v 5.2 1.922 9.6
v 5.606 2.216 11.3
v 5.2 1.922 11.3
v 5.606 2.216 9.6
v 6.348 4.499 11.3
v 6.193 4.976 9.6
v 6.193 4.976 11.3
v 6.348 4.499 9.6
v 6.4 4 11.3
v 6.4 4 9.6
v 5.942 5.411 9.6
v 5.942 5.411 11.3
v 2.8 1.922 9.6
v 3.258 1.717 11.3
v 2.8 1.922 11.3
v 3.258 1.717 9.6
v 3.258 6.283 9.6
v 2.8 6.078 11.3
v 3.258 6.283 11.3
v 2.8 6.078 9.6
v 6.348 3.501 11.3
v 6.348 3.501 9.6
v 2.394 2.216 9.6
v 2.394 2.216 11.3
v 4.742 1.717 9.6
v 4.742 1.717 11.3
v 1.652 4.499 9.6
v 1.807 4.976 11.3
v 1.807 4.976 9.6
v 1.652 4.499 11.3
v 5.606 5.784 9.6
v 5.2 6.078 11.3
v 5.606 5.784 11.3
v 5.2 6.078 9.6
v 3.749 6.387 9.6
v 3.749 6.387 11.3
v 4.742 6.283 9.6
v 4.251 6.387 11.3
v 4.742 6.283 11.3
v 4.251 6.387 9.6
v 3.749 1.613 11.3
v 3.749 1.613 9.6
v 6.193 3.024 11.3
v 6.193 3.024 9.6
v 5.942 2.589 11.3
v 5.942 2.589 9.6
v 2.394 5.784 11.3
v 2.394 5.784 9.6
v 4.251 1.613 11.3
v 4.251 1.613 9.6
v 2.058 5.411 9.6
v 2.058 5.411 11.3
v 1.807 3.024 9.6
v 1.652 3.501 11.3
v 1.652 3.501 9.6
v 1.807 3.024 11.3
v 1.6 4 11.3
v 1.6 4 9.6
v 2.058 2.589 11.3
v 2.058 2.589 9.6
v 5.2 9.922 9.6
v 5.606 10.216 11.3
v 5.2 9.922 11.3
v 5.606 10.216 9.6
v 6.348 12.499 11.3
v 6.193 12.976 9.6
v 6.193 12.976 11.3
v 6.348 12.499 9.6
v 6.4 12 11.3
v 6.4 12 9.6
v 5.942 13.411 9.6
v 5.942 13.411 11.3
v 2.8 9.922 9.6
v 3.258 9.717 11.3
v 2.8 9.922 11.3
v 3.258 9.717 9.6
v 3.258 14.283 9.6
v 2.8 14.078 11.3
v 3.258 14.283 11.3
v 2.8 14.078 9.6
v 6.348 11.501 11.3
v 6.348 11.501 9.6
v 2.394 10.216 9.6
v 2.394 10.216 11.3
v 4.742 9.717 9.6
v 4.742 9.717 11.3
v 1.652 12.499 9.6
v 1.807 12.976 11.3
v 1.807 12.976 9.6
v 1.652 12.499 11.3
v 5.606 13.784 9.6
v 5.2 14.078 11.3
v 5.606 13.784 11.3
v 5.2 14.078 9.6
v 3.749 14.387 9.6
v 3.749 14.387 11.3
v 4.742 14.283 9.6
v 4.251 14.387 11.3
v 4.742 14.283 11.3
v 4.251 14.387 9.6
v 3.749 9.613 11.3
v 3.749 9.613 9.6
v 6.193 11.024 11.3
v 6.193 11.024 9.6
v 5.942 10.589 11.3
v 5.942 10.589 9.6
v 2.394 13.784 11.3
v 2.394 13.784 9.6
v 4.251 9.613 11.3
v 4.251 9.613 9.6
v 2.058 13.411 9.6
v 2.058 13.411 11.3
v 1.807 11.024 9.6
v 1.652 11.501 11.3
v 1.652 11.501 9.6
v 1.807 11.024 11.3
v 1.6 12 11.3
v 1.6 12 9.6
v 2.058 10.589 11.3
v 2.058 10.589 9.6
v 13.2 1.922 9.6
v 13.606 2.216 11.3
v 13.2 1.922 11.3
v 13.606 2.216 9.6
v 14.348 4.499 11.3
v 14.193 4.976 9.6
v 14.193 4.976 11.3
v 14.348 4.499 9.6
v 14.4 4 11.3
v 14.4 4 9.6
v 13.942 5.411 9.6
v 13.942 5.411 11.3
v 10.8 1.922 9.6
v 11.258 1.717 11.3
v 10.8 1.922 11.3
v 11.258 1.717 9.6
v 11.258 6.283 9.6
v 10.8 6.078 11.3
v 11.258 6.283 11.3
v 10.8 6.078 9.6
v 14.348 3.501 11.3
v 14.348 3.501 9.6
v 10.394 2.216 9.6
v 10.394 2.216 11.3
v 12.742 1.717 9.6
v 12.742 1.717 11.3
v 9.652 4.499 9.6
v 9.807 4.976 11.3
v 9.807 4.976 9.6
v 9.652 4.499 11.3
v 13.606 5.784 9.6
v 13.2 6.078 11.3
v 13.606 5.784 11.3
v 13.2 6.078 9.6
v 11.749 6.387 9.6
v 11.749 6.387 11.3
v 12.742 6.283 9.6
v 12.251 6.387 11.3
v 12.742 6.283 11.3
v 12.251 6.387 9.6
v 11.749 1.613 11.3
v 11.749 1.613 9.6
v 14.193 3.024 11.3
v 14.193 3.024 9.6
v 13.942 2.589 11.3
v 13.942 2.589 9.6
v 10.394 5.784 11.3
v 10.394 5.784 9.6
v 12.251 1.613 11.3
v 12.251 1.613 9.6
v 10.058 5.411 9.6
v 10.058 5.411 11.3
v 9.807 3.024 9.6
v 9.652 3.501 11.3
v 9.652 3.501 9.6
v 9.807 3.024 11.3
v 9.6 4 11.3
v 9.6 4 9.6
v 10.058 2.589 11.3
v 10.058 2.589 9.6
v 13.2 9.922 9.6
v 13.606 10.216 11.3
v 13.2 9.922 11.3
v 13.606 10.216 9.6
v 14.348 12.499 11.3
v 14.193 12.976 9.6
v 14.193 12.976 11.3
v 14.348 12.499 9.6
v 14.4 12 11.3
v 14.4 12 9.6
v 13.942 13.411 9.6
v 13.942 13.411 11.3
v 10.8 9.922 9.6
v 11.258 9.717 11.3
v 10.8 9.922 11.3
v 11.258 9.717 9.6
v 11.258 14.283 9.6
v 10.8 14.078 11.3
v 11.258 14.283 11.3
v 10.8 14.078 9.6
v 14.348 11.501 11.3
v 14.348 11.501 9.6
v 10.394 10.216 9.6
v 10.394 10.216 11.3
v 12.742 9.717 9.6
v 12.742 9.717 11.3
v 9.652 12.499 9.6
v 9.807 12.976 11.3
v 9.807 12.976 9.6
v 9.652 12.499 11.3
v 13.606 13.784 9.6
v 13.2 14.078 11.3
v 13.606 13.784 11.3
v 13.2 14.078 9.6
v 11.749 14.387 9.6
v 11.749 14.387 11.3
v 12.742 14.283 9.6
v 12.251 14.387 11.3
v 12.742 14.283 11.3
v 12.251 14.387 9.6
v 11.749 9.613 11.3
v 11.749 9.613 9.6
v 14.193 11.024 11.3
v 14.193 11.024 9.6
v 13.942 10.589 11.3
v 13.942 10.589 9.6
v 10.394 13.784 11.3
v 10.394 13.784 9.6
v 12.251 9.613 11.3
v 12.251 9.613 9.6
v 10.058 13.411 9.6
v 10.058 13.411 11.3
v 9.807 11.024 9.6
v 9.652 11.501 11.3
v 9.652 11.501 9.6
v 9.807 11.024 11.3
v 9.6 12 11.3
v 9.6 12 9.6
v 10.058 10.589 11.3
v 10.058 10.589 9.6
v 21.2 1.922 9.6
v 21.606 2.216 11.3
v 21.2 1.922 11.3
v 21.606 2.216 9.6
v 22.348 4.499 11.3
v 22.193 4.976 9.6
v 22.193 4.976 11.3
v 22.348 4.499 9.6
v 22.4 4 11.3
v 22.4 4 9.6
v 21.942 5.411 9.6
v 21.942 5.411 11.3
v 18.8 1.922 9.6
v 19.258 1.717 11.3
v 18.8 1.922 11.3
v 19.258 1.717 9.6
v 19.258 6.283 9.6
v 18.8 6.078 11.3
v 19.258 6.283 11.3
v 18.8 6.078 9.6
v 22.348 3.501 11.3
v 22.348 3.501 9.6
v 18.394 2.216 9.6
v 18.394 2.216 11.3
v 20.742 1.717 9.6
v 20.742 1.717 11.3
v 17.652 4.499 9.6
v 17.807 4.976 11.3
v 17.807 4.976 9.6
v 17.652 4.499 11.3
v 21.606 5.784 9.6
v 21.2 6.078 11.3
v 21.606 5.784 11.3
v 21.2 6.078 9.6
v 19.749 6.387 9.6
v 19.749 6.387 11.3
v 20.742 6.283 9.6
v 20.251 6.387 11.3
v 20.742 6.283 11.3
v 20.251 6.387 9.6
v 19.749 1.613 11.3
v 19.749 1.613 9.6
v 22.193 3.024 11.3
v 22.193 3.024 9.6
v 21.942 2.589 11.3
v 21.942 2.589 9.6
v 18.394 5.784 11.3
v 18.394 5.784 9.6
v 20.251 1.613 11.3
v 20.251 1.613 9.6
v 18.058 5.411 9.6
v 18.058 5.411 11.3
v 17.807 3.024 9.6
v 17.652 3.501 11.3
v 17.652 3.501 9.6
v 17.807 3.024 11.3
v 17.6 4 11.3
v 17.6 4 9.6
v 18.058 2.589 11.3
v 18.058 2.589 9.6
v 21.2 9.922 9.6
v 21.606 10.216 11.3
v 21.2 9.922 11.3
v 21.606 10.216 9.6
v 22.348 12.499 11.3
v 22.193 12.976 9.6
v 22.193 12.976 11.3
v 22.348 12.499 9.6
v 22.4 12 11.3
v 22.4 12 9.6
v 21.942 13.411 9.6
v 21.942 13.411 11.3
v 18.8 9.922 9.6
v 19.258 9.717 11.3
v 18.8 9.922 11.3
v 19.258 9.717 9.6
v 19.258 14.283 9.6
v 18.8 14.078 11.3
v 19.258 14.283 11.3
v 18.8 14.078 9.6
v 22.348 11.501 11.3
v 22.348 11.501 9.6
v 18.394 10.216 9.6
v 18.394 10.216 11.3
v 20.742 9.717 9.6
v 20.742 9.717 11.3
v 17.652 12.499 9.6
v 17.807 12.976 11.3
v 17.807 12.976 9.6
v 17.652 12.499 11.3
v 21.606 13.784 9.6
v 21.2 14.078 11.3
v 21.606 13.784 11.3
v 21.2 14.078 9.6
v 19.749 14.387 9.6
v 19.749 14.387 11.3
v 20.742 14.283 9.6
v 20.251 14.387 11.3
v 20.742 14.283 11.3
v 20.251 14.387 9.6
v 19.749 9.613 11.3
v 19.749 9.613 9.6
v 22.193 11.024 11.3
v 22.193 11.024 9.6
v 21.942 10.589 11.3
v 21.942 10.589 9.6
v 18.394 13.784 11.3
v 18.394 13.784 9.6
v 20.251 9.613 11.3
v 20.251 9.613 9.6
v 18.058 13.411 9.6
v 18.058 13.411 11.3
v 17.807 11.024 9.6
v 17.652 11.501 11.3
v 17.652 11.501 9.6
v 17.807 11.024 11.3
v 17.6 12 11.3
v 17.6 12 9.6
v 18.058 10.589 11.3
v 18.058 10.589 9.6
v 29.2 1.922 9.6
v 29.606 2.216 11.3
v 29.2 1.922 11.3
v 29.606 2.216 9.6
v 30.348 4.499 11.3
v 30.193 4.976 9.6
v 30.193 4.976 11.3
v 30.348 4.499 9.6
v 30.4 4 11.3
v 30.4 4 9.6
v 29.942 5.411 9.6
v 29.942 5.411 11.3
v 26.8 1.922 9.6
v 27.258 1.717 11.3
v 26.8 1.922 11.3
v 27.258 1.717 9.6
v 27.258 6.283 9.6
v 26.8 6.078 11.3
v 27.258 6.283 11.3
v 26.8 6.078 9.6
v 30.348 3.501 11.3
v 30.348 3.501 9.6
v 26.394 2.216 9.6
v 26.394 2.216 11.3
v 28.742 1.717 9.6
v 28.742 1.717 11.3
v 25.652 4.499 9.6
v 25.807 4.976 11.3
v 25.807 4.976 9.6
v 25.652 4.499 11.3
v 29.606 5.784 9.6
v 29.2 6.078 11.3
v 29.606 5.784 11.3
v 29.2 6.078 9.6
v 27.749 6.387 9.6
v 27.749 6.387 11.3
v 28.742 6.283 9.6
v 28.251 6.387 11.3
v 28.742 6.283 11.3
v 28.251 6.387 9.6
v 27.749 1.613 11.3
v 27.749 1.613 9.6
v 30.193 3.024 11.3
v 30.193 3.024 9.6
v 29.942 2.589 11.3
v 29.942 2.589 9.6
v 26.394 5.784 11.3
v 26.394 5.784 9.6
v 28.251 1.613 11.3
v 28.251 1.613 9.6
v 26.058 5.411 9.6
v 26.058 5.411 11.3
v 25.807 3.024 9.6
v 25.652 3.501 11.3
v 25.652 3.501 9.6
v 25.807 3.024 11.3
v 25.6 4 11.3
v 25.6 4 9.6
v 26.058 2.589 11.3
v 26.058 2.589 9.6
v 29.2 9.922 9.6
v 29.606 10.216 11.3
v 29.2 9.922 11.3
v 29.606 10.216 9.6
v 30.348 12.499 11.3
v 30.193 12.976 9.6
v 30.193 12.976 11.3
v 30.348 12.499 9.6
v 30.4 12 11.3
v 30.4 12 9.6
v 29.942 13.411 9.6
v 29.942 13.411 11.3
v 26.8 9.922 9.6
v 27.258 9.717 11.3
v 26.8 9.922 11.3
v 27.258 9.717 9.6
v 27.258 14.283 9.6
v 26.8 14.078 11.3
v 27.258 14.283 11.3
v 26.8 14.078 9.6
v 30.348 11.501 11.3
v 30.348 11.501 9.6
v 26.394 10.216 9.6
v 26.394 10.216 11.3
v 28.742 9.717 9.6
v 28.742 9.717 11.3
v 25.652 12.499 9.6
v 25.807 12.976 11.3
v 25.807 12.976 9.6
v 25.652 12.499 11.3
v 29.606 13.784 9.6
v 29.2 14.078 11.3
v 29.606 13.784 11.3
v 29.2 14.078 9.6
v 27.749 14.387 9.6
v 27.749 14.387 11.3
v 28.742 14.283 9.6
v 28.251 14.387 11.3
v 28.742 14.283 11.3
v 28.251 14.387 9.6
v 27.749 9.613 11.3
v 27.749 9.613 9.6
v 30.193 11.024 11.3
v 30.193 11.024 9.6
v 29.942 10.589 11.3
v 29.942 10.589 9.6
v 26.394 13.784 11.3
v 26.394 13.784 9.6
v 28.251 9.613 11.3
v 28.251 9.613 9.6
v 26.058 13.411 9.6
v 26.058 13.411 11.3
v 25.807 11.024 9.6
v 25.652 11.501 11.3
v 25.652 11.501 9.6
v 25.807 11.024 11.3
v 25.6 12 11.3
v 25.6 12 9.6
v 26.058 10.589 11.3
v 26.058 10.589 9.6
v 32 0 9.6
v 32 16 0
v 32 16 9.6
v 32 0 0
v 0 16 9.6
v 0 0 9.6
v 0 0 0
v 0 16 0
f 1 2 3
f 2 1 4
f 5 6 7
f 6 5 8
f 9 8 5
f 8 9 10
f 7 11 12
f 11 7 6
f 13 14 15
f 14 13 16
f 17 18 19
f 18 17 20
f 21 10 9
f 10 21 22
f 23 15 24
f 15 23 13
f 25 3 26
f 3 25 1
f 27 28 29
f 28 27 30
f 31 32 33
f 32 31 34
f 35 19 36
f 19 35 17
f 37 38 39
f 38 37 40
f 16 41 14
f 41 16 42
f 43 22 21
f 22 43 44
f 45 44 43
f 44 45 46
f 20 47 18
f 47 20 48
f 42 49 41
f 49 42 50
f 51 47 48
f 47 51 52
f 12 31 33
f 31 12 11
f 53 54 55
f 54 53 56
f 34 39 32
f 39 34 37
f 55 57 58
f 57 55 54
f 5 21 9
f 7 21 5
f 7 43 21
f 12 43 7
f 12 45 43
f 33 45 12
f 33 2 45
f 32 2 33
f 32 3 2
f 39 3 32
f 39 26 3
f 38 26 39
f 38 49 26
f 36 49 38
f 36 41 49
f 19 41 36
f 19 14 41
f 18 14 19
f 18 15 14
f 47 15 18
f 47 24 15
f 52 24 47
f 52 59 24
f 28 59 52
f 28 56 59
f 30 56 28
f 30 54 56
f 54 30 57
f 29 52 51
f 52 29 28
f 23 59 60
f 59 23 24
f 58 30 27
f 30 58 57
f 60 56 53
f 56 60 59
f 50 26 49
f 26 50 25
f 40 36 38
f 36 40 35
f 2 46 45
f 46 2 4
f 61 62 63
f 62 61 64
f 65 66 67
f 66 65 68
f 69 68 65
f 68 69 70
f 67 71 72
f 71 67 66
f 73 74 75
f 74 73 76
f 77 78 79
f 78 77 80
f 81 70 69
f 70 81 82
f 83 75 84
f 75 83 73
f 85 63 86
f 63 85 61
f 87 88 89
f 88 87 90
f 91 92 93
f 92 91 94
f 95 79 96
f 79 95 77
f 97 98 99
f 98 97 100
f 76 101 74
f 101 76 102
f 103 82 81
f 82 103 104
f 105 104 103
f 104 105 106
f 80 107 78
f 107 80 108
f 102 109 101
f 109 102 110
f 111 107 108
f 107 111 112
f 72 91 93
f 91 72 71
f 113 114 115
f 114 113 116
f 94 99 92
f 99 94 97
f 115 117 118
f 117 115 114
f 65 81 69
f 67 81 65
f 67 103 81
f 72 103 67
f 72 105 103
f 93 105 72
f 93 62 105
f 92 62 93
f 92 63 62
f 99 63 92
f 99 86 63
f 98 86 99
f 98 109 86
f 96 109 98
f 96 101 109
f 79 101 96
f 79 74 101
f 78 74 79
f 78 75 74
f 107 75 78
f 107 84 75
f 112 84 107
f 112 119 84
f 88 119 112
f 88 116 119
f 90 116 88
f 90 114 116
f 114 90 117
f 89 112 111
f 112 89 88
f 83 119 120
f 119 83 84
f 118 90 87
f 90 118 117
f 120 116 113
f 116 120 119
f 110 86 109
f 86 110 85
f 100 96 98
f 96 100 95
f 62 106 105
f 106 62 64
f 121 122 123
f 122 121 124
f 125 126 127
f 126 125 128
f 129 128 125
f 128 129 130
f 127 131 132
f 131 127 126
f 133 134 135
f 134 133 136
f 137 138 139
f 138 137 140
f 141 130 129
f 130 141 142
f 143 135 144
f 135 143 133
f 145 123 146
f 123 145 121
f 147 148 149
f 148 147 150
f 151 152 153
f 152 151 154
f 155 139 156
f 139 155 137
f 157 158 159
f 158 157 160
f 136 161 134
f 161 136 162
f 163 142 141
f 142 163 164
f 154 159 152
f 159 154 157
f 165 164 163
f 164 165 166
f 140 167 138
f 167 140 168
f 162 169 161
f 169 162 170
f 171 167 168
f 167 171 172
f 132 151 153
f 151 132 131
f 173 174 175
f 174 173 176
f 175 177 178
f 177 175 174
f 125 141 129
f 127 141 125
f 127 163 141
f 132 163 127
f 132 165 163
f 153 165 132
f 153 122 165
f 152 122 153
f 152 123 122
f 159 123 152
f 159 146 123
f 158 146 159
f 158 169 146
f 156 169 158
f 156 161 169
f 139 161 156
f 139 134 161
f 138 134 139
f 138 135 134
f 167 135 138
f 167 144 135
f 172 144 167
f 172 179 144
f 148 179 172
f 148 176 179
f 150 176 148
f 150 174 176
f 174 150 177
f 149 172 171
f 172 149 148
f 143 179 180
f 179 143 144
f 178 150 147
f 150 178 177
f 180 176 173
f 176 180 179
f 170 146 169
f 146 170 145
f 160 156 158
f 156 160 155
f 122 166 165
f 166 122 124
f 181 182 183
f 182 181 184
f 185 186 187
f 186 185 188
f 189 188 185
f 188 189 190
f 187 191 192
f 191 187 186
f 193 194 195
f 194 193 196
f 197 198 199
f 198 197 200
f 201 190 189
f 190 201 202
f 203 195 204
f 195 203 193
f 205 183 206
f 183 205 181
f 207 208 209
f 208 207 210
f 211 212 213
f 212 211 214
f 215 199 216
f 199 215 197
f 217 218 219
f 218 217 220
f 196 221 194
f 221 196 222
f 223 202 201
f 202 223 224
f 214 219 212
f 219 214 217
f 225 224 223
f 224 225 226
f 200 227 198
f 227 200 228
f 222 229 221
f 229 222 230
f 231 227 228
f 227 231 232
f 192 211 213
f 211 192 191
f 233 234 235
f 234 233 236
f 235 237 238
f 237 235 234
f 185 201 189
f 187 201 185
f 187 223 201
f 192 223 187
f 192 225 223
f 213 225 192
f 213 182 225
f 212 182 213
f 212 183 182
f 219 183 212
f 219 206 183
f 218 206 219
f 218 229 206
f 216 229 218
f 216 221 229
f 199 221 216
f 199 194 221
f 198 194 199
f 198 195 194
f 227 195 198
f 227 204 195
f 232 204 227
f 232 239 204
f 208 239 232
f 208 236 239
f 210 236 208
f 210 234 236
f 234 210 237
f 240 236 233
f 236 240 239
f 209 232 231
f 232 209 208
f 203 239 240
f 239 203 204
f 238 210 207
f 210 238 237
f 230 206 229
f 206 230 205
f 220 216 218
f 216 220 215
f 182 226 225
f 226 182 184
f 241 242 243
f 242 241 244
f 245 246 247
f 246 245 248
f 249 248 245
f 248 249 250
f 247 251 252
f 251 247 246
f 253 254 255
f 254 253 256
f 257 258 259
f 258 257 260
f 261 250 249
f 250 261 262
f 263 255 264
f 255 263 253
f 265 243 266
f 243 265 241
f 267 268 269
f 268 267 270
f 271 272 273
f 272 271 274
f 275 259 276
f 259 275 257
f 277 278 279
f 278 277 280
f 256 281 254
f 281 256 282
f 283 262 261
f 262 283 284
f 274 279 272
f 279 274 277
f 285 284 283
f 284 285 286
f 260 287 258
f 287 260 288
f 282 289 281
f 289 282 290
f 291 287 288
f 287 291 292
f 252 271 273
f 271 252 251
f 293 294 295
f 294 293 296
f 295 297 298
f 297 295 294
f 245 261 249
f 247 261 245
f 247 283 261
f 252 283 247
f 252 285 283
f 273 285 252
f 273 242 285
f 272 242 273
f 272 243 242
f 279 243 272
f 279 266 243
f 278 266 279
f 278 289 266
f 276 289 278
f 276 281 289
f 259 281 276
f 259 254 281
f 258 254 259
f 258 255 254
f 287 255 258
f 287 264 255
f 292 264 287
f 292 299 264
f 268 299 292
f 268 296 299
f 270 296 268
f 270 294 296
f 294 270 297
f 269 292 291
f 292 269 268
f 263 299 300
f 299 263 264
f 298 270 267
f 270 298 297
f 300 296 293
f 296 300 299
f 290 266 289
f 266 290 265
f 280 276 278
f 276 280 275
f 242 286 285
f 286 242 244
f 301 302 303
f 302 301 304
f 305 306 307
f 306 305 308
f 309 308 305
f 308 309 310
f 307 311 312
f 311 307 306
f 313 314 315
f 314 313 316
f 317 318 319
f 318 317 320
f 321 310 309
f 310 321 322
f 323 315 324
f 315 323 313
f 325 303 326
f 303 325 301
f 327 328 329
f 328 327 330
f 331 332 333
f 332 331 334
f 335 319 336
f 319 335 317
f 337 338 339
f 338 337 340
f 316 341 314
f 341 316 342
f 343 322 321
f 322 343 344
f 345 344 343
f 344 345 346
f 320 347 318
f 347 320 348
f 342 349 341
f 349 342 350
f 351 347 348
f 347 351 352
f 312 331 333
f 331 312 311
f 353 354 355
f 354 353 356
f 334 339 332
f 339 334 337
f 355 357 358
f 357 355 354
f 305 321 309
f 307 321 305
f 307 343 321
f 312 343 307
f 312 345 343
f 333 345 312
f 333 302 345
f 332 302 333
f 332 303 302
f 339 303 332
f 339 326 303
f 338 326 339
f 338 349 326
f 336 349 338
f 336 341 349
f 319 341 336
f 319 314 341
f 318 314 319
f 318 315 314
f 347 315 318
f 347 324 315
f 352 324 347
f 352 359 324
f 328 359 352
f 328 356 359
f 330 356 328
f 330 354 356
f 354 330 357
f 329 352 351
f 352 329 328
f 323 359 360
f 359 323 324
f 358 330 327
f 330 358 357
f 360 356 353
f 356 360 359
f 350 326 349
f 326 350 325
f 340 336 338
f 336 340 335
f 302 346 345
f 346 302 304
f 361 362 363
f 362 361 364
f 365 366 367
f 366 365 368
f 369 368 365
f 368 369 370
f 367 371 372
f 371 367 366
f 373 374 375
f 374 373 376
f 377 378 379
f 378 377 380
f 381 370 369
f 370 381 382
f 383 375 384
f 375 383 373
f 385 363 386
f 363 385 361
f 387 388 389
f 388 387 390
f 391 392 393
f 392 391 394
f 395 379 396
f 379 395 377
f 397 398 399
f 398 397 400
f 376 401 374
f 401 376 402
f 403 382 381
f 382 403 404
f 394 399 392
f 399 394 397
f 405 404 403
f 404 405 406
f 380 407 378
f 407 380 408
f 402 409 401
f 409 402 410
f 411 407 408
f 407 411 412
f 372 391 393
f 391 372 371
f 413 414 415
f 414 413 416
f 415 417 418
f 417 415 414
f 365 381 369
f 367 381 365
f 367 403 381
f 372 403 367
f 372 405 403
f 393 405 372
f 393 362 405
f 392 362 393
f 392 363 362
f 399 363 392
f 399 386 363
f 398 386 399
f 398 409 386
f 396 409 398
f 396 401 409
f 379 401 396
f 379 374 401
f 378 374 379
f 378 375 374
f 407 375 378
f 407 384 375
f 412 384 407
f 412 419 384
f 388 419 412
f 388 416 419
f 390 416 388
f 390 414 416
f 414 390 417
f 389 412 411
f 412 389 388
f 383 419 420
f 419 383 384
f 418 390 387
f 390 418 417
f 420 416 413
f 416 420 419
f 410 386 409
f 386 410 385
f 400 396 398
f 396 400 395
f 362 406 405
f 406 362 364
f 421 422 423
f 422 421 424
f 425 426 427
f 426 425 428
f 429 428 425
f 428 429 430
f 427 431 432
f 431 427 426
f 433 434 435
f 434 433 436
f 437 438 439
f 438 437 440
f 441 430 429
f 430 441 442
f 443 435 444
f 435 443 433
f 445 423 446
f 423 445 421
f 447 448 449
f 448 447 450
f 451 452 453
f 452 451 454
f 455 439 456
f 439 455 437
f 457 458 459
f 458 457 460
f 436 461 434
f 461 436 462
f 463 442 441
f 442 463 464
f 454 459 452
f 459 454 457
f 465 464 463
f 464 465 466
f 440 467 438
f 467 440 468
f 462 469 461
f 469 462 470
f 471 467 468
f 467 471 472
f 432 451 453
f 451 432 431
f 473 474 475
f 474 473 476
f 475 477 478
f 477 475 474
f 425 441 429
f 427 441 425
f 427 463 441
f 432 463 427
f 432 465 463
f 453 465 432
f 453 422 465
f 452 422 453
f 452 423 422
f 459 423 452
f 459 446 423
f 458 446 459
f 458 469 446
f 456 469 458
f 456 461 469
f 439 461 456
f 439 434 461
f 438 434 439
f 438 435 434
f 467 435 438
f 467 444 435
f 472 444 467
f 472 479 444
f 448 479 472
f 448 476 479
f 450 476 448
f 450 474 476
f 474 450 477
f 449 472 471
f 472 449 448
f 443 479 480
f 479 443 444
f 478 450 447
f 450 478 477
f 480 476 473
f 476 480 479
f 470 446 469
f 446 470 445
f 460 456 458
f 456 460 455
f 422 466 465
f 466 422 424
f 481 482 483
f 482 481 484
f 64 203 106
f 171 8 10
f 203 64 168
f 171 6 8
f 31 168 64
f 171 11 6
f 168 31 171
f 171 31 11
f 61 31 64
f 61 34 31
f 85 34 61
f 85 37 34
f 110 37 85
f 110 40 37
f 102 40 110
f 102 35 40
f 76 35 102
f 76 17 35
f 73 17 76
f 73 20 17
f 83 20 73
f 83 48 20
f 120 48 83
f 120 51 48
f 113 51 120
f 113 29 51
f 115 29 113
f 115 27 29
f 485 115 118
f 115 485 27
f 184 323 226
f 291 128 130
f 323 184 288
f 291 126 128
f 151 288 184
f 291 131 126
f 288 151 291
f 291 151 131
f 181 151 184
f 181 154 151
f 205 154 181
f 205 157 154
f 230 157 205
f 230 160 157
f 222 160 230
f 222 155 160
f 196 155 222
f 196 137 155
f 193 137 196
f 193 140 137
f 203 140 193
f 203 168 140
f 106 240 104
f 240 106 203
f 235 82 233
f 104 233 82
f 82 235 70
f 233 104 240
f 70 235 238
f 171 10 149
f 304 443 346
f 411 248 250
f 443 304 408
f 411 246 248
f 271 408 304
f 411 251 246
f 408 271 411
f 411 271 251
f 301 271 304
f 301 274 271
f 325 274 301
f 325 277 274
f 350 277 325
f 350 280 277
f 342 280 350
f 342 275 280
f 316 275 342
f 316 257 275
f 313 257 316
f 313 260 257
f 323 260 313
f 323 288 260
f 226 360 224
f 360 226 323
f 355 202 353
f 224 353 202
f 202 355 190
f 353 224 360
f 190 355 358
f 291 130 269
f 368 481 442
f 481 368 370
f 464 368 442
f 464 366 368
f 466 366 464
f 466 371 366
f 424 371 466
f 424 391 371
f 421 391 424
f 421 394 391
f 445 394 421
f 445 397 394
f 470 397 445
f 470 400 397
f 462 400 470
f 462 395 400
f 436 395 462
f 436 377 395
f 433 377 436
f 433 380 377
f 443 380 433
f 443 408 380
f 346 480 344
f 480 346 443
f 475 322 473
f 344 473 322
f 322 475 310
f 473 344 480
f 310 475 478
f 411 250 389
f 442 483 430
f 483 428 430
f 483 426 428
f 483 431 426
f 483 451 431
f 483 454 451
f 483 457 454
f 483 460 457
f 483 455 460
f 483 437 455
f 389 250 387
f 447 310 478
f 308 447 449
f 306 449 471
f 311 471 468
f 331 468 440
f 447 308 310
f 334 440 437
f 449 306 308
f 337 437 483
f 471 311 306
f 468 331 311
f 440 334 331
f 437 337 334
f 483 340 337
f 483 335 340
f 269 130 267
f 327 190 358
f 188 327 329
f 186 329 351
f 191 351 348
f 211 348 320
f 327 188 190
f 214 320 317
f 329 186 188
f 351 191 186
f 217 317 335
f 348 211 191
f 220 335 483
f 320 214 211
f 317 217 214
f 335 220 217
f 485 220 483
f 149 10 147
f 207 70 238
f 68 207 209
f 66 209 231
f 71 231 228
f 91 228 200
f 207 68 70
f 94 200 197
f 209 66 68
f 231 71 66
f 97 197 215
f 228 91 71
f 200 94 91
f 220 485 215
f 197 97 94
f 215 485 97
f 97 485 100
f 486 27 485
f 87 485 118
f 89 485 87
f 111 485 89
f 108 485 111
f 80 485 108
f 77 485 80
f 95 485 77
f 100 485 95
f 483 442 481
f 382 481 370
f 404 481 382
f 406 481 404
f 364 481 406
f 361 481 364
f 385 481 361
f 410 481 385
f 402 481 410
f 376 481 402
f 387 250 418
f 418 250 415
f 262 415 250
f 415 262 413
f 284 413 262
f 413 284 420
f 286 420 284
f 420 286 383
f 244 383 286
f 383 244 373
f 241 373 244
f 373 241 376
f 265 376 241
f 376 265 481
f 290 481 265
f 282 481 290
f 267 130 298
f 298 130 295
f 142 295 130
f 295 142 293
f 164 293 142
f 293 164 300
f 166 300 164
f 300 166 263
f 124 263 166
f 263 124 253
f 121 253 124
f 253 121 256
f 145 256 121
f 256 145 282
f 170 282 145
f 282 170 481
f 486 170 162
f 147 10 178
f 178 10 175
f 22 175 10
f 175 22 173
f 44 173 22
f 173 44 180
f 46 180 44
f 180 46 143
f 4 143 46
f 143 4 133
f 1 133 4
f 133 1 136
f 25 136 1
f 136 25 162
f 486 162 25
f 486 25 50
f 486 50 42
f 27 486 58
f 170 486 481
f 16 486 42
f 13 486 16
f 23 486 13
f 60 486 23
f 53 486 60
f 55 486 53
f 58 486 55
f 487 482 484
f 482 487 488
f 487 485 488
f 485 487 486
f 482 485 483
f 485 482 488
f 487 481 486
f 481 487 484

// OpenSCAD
module LEGO(studs_per_row=4) {
    $fn=30;
    
    length = studs_per_row * 8;

    cube([length, 16, 9.6]);
    
    for (x_position=[4 : 8 : length-4]) {
        translate([x_position, 4, 1.7]) cylinder(h=9.6, d=4.8);
        translate([x_position, 12, 1.7]) cylinder(h=9.6, d=4.8);
    }
}

LEGO(4);
